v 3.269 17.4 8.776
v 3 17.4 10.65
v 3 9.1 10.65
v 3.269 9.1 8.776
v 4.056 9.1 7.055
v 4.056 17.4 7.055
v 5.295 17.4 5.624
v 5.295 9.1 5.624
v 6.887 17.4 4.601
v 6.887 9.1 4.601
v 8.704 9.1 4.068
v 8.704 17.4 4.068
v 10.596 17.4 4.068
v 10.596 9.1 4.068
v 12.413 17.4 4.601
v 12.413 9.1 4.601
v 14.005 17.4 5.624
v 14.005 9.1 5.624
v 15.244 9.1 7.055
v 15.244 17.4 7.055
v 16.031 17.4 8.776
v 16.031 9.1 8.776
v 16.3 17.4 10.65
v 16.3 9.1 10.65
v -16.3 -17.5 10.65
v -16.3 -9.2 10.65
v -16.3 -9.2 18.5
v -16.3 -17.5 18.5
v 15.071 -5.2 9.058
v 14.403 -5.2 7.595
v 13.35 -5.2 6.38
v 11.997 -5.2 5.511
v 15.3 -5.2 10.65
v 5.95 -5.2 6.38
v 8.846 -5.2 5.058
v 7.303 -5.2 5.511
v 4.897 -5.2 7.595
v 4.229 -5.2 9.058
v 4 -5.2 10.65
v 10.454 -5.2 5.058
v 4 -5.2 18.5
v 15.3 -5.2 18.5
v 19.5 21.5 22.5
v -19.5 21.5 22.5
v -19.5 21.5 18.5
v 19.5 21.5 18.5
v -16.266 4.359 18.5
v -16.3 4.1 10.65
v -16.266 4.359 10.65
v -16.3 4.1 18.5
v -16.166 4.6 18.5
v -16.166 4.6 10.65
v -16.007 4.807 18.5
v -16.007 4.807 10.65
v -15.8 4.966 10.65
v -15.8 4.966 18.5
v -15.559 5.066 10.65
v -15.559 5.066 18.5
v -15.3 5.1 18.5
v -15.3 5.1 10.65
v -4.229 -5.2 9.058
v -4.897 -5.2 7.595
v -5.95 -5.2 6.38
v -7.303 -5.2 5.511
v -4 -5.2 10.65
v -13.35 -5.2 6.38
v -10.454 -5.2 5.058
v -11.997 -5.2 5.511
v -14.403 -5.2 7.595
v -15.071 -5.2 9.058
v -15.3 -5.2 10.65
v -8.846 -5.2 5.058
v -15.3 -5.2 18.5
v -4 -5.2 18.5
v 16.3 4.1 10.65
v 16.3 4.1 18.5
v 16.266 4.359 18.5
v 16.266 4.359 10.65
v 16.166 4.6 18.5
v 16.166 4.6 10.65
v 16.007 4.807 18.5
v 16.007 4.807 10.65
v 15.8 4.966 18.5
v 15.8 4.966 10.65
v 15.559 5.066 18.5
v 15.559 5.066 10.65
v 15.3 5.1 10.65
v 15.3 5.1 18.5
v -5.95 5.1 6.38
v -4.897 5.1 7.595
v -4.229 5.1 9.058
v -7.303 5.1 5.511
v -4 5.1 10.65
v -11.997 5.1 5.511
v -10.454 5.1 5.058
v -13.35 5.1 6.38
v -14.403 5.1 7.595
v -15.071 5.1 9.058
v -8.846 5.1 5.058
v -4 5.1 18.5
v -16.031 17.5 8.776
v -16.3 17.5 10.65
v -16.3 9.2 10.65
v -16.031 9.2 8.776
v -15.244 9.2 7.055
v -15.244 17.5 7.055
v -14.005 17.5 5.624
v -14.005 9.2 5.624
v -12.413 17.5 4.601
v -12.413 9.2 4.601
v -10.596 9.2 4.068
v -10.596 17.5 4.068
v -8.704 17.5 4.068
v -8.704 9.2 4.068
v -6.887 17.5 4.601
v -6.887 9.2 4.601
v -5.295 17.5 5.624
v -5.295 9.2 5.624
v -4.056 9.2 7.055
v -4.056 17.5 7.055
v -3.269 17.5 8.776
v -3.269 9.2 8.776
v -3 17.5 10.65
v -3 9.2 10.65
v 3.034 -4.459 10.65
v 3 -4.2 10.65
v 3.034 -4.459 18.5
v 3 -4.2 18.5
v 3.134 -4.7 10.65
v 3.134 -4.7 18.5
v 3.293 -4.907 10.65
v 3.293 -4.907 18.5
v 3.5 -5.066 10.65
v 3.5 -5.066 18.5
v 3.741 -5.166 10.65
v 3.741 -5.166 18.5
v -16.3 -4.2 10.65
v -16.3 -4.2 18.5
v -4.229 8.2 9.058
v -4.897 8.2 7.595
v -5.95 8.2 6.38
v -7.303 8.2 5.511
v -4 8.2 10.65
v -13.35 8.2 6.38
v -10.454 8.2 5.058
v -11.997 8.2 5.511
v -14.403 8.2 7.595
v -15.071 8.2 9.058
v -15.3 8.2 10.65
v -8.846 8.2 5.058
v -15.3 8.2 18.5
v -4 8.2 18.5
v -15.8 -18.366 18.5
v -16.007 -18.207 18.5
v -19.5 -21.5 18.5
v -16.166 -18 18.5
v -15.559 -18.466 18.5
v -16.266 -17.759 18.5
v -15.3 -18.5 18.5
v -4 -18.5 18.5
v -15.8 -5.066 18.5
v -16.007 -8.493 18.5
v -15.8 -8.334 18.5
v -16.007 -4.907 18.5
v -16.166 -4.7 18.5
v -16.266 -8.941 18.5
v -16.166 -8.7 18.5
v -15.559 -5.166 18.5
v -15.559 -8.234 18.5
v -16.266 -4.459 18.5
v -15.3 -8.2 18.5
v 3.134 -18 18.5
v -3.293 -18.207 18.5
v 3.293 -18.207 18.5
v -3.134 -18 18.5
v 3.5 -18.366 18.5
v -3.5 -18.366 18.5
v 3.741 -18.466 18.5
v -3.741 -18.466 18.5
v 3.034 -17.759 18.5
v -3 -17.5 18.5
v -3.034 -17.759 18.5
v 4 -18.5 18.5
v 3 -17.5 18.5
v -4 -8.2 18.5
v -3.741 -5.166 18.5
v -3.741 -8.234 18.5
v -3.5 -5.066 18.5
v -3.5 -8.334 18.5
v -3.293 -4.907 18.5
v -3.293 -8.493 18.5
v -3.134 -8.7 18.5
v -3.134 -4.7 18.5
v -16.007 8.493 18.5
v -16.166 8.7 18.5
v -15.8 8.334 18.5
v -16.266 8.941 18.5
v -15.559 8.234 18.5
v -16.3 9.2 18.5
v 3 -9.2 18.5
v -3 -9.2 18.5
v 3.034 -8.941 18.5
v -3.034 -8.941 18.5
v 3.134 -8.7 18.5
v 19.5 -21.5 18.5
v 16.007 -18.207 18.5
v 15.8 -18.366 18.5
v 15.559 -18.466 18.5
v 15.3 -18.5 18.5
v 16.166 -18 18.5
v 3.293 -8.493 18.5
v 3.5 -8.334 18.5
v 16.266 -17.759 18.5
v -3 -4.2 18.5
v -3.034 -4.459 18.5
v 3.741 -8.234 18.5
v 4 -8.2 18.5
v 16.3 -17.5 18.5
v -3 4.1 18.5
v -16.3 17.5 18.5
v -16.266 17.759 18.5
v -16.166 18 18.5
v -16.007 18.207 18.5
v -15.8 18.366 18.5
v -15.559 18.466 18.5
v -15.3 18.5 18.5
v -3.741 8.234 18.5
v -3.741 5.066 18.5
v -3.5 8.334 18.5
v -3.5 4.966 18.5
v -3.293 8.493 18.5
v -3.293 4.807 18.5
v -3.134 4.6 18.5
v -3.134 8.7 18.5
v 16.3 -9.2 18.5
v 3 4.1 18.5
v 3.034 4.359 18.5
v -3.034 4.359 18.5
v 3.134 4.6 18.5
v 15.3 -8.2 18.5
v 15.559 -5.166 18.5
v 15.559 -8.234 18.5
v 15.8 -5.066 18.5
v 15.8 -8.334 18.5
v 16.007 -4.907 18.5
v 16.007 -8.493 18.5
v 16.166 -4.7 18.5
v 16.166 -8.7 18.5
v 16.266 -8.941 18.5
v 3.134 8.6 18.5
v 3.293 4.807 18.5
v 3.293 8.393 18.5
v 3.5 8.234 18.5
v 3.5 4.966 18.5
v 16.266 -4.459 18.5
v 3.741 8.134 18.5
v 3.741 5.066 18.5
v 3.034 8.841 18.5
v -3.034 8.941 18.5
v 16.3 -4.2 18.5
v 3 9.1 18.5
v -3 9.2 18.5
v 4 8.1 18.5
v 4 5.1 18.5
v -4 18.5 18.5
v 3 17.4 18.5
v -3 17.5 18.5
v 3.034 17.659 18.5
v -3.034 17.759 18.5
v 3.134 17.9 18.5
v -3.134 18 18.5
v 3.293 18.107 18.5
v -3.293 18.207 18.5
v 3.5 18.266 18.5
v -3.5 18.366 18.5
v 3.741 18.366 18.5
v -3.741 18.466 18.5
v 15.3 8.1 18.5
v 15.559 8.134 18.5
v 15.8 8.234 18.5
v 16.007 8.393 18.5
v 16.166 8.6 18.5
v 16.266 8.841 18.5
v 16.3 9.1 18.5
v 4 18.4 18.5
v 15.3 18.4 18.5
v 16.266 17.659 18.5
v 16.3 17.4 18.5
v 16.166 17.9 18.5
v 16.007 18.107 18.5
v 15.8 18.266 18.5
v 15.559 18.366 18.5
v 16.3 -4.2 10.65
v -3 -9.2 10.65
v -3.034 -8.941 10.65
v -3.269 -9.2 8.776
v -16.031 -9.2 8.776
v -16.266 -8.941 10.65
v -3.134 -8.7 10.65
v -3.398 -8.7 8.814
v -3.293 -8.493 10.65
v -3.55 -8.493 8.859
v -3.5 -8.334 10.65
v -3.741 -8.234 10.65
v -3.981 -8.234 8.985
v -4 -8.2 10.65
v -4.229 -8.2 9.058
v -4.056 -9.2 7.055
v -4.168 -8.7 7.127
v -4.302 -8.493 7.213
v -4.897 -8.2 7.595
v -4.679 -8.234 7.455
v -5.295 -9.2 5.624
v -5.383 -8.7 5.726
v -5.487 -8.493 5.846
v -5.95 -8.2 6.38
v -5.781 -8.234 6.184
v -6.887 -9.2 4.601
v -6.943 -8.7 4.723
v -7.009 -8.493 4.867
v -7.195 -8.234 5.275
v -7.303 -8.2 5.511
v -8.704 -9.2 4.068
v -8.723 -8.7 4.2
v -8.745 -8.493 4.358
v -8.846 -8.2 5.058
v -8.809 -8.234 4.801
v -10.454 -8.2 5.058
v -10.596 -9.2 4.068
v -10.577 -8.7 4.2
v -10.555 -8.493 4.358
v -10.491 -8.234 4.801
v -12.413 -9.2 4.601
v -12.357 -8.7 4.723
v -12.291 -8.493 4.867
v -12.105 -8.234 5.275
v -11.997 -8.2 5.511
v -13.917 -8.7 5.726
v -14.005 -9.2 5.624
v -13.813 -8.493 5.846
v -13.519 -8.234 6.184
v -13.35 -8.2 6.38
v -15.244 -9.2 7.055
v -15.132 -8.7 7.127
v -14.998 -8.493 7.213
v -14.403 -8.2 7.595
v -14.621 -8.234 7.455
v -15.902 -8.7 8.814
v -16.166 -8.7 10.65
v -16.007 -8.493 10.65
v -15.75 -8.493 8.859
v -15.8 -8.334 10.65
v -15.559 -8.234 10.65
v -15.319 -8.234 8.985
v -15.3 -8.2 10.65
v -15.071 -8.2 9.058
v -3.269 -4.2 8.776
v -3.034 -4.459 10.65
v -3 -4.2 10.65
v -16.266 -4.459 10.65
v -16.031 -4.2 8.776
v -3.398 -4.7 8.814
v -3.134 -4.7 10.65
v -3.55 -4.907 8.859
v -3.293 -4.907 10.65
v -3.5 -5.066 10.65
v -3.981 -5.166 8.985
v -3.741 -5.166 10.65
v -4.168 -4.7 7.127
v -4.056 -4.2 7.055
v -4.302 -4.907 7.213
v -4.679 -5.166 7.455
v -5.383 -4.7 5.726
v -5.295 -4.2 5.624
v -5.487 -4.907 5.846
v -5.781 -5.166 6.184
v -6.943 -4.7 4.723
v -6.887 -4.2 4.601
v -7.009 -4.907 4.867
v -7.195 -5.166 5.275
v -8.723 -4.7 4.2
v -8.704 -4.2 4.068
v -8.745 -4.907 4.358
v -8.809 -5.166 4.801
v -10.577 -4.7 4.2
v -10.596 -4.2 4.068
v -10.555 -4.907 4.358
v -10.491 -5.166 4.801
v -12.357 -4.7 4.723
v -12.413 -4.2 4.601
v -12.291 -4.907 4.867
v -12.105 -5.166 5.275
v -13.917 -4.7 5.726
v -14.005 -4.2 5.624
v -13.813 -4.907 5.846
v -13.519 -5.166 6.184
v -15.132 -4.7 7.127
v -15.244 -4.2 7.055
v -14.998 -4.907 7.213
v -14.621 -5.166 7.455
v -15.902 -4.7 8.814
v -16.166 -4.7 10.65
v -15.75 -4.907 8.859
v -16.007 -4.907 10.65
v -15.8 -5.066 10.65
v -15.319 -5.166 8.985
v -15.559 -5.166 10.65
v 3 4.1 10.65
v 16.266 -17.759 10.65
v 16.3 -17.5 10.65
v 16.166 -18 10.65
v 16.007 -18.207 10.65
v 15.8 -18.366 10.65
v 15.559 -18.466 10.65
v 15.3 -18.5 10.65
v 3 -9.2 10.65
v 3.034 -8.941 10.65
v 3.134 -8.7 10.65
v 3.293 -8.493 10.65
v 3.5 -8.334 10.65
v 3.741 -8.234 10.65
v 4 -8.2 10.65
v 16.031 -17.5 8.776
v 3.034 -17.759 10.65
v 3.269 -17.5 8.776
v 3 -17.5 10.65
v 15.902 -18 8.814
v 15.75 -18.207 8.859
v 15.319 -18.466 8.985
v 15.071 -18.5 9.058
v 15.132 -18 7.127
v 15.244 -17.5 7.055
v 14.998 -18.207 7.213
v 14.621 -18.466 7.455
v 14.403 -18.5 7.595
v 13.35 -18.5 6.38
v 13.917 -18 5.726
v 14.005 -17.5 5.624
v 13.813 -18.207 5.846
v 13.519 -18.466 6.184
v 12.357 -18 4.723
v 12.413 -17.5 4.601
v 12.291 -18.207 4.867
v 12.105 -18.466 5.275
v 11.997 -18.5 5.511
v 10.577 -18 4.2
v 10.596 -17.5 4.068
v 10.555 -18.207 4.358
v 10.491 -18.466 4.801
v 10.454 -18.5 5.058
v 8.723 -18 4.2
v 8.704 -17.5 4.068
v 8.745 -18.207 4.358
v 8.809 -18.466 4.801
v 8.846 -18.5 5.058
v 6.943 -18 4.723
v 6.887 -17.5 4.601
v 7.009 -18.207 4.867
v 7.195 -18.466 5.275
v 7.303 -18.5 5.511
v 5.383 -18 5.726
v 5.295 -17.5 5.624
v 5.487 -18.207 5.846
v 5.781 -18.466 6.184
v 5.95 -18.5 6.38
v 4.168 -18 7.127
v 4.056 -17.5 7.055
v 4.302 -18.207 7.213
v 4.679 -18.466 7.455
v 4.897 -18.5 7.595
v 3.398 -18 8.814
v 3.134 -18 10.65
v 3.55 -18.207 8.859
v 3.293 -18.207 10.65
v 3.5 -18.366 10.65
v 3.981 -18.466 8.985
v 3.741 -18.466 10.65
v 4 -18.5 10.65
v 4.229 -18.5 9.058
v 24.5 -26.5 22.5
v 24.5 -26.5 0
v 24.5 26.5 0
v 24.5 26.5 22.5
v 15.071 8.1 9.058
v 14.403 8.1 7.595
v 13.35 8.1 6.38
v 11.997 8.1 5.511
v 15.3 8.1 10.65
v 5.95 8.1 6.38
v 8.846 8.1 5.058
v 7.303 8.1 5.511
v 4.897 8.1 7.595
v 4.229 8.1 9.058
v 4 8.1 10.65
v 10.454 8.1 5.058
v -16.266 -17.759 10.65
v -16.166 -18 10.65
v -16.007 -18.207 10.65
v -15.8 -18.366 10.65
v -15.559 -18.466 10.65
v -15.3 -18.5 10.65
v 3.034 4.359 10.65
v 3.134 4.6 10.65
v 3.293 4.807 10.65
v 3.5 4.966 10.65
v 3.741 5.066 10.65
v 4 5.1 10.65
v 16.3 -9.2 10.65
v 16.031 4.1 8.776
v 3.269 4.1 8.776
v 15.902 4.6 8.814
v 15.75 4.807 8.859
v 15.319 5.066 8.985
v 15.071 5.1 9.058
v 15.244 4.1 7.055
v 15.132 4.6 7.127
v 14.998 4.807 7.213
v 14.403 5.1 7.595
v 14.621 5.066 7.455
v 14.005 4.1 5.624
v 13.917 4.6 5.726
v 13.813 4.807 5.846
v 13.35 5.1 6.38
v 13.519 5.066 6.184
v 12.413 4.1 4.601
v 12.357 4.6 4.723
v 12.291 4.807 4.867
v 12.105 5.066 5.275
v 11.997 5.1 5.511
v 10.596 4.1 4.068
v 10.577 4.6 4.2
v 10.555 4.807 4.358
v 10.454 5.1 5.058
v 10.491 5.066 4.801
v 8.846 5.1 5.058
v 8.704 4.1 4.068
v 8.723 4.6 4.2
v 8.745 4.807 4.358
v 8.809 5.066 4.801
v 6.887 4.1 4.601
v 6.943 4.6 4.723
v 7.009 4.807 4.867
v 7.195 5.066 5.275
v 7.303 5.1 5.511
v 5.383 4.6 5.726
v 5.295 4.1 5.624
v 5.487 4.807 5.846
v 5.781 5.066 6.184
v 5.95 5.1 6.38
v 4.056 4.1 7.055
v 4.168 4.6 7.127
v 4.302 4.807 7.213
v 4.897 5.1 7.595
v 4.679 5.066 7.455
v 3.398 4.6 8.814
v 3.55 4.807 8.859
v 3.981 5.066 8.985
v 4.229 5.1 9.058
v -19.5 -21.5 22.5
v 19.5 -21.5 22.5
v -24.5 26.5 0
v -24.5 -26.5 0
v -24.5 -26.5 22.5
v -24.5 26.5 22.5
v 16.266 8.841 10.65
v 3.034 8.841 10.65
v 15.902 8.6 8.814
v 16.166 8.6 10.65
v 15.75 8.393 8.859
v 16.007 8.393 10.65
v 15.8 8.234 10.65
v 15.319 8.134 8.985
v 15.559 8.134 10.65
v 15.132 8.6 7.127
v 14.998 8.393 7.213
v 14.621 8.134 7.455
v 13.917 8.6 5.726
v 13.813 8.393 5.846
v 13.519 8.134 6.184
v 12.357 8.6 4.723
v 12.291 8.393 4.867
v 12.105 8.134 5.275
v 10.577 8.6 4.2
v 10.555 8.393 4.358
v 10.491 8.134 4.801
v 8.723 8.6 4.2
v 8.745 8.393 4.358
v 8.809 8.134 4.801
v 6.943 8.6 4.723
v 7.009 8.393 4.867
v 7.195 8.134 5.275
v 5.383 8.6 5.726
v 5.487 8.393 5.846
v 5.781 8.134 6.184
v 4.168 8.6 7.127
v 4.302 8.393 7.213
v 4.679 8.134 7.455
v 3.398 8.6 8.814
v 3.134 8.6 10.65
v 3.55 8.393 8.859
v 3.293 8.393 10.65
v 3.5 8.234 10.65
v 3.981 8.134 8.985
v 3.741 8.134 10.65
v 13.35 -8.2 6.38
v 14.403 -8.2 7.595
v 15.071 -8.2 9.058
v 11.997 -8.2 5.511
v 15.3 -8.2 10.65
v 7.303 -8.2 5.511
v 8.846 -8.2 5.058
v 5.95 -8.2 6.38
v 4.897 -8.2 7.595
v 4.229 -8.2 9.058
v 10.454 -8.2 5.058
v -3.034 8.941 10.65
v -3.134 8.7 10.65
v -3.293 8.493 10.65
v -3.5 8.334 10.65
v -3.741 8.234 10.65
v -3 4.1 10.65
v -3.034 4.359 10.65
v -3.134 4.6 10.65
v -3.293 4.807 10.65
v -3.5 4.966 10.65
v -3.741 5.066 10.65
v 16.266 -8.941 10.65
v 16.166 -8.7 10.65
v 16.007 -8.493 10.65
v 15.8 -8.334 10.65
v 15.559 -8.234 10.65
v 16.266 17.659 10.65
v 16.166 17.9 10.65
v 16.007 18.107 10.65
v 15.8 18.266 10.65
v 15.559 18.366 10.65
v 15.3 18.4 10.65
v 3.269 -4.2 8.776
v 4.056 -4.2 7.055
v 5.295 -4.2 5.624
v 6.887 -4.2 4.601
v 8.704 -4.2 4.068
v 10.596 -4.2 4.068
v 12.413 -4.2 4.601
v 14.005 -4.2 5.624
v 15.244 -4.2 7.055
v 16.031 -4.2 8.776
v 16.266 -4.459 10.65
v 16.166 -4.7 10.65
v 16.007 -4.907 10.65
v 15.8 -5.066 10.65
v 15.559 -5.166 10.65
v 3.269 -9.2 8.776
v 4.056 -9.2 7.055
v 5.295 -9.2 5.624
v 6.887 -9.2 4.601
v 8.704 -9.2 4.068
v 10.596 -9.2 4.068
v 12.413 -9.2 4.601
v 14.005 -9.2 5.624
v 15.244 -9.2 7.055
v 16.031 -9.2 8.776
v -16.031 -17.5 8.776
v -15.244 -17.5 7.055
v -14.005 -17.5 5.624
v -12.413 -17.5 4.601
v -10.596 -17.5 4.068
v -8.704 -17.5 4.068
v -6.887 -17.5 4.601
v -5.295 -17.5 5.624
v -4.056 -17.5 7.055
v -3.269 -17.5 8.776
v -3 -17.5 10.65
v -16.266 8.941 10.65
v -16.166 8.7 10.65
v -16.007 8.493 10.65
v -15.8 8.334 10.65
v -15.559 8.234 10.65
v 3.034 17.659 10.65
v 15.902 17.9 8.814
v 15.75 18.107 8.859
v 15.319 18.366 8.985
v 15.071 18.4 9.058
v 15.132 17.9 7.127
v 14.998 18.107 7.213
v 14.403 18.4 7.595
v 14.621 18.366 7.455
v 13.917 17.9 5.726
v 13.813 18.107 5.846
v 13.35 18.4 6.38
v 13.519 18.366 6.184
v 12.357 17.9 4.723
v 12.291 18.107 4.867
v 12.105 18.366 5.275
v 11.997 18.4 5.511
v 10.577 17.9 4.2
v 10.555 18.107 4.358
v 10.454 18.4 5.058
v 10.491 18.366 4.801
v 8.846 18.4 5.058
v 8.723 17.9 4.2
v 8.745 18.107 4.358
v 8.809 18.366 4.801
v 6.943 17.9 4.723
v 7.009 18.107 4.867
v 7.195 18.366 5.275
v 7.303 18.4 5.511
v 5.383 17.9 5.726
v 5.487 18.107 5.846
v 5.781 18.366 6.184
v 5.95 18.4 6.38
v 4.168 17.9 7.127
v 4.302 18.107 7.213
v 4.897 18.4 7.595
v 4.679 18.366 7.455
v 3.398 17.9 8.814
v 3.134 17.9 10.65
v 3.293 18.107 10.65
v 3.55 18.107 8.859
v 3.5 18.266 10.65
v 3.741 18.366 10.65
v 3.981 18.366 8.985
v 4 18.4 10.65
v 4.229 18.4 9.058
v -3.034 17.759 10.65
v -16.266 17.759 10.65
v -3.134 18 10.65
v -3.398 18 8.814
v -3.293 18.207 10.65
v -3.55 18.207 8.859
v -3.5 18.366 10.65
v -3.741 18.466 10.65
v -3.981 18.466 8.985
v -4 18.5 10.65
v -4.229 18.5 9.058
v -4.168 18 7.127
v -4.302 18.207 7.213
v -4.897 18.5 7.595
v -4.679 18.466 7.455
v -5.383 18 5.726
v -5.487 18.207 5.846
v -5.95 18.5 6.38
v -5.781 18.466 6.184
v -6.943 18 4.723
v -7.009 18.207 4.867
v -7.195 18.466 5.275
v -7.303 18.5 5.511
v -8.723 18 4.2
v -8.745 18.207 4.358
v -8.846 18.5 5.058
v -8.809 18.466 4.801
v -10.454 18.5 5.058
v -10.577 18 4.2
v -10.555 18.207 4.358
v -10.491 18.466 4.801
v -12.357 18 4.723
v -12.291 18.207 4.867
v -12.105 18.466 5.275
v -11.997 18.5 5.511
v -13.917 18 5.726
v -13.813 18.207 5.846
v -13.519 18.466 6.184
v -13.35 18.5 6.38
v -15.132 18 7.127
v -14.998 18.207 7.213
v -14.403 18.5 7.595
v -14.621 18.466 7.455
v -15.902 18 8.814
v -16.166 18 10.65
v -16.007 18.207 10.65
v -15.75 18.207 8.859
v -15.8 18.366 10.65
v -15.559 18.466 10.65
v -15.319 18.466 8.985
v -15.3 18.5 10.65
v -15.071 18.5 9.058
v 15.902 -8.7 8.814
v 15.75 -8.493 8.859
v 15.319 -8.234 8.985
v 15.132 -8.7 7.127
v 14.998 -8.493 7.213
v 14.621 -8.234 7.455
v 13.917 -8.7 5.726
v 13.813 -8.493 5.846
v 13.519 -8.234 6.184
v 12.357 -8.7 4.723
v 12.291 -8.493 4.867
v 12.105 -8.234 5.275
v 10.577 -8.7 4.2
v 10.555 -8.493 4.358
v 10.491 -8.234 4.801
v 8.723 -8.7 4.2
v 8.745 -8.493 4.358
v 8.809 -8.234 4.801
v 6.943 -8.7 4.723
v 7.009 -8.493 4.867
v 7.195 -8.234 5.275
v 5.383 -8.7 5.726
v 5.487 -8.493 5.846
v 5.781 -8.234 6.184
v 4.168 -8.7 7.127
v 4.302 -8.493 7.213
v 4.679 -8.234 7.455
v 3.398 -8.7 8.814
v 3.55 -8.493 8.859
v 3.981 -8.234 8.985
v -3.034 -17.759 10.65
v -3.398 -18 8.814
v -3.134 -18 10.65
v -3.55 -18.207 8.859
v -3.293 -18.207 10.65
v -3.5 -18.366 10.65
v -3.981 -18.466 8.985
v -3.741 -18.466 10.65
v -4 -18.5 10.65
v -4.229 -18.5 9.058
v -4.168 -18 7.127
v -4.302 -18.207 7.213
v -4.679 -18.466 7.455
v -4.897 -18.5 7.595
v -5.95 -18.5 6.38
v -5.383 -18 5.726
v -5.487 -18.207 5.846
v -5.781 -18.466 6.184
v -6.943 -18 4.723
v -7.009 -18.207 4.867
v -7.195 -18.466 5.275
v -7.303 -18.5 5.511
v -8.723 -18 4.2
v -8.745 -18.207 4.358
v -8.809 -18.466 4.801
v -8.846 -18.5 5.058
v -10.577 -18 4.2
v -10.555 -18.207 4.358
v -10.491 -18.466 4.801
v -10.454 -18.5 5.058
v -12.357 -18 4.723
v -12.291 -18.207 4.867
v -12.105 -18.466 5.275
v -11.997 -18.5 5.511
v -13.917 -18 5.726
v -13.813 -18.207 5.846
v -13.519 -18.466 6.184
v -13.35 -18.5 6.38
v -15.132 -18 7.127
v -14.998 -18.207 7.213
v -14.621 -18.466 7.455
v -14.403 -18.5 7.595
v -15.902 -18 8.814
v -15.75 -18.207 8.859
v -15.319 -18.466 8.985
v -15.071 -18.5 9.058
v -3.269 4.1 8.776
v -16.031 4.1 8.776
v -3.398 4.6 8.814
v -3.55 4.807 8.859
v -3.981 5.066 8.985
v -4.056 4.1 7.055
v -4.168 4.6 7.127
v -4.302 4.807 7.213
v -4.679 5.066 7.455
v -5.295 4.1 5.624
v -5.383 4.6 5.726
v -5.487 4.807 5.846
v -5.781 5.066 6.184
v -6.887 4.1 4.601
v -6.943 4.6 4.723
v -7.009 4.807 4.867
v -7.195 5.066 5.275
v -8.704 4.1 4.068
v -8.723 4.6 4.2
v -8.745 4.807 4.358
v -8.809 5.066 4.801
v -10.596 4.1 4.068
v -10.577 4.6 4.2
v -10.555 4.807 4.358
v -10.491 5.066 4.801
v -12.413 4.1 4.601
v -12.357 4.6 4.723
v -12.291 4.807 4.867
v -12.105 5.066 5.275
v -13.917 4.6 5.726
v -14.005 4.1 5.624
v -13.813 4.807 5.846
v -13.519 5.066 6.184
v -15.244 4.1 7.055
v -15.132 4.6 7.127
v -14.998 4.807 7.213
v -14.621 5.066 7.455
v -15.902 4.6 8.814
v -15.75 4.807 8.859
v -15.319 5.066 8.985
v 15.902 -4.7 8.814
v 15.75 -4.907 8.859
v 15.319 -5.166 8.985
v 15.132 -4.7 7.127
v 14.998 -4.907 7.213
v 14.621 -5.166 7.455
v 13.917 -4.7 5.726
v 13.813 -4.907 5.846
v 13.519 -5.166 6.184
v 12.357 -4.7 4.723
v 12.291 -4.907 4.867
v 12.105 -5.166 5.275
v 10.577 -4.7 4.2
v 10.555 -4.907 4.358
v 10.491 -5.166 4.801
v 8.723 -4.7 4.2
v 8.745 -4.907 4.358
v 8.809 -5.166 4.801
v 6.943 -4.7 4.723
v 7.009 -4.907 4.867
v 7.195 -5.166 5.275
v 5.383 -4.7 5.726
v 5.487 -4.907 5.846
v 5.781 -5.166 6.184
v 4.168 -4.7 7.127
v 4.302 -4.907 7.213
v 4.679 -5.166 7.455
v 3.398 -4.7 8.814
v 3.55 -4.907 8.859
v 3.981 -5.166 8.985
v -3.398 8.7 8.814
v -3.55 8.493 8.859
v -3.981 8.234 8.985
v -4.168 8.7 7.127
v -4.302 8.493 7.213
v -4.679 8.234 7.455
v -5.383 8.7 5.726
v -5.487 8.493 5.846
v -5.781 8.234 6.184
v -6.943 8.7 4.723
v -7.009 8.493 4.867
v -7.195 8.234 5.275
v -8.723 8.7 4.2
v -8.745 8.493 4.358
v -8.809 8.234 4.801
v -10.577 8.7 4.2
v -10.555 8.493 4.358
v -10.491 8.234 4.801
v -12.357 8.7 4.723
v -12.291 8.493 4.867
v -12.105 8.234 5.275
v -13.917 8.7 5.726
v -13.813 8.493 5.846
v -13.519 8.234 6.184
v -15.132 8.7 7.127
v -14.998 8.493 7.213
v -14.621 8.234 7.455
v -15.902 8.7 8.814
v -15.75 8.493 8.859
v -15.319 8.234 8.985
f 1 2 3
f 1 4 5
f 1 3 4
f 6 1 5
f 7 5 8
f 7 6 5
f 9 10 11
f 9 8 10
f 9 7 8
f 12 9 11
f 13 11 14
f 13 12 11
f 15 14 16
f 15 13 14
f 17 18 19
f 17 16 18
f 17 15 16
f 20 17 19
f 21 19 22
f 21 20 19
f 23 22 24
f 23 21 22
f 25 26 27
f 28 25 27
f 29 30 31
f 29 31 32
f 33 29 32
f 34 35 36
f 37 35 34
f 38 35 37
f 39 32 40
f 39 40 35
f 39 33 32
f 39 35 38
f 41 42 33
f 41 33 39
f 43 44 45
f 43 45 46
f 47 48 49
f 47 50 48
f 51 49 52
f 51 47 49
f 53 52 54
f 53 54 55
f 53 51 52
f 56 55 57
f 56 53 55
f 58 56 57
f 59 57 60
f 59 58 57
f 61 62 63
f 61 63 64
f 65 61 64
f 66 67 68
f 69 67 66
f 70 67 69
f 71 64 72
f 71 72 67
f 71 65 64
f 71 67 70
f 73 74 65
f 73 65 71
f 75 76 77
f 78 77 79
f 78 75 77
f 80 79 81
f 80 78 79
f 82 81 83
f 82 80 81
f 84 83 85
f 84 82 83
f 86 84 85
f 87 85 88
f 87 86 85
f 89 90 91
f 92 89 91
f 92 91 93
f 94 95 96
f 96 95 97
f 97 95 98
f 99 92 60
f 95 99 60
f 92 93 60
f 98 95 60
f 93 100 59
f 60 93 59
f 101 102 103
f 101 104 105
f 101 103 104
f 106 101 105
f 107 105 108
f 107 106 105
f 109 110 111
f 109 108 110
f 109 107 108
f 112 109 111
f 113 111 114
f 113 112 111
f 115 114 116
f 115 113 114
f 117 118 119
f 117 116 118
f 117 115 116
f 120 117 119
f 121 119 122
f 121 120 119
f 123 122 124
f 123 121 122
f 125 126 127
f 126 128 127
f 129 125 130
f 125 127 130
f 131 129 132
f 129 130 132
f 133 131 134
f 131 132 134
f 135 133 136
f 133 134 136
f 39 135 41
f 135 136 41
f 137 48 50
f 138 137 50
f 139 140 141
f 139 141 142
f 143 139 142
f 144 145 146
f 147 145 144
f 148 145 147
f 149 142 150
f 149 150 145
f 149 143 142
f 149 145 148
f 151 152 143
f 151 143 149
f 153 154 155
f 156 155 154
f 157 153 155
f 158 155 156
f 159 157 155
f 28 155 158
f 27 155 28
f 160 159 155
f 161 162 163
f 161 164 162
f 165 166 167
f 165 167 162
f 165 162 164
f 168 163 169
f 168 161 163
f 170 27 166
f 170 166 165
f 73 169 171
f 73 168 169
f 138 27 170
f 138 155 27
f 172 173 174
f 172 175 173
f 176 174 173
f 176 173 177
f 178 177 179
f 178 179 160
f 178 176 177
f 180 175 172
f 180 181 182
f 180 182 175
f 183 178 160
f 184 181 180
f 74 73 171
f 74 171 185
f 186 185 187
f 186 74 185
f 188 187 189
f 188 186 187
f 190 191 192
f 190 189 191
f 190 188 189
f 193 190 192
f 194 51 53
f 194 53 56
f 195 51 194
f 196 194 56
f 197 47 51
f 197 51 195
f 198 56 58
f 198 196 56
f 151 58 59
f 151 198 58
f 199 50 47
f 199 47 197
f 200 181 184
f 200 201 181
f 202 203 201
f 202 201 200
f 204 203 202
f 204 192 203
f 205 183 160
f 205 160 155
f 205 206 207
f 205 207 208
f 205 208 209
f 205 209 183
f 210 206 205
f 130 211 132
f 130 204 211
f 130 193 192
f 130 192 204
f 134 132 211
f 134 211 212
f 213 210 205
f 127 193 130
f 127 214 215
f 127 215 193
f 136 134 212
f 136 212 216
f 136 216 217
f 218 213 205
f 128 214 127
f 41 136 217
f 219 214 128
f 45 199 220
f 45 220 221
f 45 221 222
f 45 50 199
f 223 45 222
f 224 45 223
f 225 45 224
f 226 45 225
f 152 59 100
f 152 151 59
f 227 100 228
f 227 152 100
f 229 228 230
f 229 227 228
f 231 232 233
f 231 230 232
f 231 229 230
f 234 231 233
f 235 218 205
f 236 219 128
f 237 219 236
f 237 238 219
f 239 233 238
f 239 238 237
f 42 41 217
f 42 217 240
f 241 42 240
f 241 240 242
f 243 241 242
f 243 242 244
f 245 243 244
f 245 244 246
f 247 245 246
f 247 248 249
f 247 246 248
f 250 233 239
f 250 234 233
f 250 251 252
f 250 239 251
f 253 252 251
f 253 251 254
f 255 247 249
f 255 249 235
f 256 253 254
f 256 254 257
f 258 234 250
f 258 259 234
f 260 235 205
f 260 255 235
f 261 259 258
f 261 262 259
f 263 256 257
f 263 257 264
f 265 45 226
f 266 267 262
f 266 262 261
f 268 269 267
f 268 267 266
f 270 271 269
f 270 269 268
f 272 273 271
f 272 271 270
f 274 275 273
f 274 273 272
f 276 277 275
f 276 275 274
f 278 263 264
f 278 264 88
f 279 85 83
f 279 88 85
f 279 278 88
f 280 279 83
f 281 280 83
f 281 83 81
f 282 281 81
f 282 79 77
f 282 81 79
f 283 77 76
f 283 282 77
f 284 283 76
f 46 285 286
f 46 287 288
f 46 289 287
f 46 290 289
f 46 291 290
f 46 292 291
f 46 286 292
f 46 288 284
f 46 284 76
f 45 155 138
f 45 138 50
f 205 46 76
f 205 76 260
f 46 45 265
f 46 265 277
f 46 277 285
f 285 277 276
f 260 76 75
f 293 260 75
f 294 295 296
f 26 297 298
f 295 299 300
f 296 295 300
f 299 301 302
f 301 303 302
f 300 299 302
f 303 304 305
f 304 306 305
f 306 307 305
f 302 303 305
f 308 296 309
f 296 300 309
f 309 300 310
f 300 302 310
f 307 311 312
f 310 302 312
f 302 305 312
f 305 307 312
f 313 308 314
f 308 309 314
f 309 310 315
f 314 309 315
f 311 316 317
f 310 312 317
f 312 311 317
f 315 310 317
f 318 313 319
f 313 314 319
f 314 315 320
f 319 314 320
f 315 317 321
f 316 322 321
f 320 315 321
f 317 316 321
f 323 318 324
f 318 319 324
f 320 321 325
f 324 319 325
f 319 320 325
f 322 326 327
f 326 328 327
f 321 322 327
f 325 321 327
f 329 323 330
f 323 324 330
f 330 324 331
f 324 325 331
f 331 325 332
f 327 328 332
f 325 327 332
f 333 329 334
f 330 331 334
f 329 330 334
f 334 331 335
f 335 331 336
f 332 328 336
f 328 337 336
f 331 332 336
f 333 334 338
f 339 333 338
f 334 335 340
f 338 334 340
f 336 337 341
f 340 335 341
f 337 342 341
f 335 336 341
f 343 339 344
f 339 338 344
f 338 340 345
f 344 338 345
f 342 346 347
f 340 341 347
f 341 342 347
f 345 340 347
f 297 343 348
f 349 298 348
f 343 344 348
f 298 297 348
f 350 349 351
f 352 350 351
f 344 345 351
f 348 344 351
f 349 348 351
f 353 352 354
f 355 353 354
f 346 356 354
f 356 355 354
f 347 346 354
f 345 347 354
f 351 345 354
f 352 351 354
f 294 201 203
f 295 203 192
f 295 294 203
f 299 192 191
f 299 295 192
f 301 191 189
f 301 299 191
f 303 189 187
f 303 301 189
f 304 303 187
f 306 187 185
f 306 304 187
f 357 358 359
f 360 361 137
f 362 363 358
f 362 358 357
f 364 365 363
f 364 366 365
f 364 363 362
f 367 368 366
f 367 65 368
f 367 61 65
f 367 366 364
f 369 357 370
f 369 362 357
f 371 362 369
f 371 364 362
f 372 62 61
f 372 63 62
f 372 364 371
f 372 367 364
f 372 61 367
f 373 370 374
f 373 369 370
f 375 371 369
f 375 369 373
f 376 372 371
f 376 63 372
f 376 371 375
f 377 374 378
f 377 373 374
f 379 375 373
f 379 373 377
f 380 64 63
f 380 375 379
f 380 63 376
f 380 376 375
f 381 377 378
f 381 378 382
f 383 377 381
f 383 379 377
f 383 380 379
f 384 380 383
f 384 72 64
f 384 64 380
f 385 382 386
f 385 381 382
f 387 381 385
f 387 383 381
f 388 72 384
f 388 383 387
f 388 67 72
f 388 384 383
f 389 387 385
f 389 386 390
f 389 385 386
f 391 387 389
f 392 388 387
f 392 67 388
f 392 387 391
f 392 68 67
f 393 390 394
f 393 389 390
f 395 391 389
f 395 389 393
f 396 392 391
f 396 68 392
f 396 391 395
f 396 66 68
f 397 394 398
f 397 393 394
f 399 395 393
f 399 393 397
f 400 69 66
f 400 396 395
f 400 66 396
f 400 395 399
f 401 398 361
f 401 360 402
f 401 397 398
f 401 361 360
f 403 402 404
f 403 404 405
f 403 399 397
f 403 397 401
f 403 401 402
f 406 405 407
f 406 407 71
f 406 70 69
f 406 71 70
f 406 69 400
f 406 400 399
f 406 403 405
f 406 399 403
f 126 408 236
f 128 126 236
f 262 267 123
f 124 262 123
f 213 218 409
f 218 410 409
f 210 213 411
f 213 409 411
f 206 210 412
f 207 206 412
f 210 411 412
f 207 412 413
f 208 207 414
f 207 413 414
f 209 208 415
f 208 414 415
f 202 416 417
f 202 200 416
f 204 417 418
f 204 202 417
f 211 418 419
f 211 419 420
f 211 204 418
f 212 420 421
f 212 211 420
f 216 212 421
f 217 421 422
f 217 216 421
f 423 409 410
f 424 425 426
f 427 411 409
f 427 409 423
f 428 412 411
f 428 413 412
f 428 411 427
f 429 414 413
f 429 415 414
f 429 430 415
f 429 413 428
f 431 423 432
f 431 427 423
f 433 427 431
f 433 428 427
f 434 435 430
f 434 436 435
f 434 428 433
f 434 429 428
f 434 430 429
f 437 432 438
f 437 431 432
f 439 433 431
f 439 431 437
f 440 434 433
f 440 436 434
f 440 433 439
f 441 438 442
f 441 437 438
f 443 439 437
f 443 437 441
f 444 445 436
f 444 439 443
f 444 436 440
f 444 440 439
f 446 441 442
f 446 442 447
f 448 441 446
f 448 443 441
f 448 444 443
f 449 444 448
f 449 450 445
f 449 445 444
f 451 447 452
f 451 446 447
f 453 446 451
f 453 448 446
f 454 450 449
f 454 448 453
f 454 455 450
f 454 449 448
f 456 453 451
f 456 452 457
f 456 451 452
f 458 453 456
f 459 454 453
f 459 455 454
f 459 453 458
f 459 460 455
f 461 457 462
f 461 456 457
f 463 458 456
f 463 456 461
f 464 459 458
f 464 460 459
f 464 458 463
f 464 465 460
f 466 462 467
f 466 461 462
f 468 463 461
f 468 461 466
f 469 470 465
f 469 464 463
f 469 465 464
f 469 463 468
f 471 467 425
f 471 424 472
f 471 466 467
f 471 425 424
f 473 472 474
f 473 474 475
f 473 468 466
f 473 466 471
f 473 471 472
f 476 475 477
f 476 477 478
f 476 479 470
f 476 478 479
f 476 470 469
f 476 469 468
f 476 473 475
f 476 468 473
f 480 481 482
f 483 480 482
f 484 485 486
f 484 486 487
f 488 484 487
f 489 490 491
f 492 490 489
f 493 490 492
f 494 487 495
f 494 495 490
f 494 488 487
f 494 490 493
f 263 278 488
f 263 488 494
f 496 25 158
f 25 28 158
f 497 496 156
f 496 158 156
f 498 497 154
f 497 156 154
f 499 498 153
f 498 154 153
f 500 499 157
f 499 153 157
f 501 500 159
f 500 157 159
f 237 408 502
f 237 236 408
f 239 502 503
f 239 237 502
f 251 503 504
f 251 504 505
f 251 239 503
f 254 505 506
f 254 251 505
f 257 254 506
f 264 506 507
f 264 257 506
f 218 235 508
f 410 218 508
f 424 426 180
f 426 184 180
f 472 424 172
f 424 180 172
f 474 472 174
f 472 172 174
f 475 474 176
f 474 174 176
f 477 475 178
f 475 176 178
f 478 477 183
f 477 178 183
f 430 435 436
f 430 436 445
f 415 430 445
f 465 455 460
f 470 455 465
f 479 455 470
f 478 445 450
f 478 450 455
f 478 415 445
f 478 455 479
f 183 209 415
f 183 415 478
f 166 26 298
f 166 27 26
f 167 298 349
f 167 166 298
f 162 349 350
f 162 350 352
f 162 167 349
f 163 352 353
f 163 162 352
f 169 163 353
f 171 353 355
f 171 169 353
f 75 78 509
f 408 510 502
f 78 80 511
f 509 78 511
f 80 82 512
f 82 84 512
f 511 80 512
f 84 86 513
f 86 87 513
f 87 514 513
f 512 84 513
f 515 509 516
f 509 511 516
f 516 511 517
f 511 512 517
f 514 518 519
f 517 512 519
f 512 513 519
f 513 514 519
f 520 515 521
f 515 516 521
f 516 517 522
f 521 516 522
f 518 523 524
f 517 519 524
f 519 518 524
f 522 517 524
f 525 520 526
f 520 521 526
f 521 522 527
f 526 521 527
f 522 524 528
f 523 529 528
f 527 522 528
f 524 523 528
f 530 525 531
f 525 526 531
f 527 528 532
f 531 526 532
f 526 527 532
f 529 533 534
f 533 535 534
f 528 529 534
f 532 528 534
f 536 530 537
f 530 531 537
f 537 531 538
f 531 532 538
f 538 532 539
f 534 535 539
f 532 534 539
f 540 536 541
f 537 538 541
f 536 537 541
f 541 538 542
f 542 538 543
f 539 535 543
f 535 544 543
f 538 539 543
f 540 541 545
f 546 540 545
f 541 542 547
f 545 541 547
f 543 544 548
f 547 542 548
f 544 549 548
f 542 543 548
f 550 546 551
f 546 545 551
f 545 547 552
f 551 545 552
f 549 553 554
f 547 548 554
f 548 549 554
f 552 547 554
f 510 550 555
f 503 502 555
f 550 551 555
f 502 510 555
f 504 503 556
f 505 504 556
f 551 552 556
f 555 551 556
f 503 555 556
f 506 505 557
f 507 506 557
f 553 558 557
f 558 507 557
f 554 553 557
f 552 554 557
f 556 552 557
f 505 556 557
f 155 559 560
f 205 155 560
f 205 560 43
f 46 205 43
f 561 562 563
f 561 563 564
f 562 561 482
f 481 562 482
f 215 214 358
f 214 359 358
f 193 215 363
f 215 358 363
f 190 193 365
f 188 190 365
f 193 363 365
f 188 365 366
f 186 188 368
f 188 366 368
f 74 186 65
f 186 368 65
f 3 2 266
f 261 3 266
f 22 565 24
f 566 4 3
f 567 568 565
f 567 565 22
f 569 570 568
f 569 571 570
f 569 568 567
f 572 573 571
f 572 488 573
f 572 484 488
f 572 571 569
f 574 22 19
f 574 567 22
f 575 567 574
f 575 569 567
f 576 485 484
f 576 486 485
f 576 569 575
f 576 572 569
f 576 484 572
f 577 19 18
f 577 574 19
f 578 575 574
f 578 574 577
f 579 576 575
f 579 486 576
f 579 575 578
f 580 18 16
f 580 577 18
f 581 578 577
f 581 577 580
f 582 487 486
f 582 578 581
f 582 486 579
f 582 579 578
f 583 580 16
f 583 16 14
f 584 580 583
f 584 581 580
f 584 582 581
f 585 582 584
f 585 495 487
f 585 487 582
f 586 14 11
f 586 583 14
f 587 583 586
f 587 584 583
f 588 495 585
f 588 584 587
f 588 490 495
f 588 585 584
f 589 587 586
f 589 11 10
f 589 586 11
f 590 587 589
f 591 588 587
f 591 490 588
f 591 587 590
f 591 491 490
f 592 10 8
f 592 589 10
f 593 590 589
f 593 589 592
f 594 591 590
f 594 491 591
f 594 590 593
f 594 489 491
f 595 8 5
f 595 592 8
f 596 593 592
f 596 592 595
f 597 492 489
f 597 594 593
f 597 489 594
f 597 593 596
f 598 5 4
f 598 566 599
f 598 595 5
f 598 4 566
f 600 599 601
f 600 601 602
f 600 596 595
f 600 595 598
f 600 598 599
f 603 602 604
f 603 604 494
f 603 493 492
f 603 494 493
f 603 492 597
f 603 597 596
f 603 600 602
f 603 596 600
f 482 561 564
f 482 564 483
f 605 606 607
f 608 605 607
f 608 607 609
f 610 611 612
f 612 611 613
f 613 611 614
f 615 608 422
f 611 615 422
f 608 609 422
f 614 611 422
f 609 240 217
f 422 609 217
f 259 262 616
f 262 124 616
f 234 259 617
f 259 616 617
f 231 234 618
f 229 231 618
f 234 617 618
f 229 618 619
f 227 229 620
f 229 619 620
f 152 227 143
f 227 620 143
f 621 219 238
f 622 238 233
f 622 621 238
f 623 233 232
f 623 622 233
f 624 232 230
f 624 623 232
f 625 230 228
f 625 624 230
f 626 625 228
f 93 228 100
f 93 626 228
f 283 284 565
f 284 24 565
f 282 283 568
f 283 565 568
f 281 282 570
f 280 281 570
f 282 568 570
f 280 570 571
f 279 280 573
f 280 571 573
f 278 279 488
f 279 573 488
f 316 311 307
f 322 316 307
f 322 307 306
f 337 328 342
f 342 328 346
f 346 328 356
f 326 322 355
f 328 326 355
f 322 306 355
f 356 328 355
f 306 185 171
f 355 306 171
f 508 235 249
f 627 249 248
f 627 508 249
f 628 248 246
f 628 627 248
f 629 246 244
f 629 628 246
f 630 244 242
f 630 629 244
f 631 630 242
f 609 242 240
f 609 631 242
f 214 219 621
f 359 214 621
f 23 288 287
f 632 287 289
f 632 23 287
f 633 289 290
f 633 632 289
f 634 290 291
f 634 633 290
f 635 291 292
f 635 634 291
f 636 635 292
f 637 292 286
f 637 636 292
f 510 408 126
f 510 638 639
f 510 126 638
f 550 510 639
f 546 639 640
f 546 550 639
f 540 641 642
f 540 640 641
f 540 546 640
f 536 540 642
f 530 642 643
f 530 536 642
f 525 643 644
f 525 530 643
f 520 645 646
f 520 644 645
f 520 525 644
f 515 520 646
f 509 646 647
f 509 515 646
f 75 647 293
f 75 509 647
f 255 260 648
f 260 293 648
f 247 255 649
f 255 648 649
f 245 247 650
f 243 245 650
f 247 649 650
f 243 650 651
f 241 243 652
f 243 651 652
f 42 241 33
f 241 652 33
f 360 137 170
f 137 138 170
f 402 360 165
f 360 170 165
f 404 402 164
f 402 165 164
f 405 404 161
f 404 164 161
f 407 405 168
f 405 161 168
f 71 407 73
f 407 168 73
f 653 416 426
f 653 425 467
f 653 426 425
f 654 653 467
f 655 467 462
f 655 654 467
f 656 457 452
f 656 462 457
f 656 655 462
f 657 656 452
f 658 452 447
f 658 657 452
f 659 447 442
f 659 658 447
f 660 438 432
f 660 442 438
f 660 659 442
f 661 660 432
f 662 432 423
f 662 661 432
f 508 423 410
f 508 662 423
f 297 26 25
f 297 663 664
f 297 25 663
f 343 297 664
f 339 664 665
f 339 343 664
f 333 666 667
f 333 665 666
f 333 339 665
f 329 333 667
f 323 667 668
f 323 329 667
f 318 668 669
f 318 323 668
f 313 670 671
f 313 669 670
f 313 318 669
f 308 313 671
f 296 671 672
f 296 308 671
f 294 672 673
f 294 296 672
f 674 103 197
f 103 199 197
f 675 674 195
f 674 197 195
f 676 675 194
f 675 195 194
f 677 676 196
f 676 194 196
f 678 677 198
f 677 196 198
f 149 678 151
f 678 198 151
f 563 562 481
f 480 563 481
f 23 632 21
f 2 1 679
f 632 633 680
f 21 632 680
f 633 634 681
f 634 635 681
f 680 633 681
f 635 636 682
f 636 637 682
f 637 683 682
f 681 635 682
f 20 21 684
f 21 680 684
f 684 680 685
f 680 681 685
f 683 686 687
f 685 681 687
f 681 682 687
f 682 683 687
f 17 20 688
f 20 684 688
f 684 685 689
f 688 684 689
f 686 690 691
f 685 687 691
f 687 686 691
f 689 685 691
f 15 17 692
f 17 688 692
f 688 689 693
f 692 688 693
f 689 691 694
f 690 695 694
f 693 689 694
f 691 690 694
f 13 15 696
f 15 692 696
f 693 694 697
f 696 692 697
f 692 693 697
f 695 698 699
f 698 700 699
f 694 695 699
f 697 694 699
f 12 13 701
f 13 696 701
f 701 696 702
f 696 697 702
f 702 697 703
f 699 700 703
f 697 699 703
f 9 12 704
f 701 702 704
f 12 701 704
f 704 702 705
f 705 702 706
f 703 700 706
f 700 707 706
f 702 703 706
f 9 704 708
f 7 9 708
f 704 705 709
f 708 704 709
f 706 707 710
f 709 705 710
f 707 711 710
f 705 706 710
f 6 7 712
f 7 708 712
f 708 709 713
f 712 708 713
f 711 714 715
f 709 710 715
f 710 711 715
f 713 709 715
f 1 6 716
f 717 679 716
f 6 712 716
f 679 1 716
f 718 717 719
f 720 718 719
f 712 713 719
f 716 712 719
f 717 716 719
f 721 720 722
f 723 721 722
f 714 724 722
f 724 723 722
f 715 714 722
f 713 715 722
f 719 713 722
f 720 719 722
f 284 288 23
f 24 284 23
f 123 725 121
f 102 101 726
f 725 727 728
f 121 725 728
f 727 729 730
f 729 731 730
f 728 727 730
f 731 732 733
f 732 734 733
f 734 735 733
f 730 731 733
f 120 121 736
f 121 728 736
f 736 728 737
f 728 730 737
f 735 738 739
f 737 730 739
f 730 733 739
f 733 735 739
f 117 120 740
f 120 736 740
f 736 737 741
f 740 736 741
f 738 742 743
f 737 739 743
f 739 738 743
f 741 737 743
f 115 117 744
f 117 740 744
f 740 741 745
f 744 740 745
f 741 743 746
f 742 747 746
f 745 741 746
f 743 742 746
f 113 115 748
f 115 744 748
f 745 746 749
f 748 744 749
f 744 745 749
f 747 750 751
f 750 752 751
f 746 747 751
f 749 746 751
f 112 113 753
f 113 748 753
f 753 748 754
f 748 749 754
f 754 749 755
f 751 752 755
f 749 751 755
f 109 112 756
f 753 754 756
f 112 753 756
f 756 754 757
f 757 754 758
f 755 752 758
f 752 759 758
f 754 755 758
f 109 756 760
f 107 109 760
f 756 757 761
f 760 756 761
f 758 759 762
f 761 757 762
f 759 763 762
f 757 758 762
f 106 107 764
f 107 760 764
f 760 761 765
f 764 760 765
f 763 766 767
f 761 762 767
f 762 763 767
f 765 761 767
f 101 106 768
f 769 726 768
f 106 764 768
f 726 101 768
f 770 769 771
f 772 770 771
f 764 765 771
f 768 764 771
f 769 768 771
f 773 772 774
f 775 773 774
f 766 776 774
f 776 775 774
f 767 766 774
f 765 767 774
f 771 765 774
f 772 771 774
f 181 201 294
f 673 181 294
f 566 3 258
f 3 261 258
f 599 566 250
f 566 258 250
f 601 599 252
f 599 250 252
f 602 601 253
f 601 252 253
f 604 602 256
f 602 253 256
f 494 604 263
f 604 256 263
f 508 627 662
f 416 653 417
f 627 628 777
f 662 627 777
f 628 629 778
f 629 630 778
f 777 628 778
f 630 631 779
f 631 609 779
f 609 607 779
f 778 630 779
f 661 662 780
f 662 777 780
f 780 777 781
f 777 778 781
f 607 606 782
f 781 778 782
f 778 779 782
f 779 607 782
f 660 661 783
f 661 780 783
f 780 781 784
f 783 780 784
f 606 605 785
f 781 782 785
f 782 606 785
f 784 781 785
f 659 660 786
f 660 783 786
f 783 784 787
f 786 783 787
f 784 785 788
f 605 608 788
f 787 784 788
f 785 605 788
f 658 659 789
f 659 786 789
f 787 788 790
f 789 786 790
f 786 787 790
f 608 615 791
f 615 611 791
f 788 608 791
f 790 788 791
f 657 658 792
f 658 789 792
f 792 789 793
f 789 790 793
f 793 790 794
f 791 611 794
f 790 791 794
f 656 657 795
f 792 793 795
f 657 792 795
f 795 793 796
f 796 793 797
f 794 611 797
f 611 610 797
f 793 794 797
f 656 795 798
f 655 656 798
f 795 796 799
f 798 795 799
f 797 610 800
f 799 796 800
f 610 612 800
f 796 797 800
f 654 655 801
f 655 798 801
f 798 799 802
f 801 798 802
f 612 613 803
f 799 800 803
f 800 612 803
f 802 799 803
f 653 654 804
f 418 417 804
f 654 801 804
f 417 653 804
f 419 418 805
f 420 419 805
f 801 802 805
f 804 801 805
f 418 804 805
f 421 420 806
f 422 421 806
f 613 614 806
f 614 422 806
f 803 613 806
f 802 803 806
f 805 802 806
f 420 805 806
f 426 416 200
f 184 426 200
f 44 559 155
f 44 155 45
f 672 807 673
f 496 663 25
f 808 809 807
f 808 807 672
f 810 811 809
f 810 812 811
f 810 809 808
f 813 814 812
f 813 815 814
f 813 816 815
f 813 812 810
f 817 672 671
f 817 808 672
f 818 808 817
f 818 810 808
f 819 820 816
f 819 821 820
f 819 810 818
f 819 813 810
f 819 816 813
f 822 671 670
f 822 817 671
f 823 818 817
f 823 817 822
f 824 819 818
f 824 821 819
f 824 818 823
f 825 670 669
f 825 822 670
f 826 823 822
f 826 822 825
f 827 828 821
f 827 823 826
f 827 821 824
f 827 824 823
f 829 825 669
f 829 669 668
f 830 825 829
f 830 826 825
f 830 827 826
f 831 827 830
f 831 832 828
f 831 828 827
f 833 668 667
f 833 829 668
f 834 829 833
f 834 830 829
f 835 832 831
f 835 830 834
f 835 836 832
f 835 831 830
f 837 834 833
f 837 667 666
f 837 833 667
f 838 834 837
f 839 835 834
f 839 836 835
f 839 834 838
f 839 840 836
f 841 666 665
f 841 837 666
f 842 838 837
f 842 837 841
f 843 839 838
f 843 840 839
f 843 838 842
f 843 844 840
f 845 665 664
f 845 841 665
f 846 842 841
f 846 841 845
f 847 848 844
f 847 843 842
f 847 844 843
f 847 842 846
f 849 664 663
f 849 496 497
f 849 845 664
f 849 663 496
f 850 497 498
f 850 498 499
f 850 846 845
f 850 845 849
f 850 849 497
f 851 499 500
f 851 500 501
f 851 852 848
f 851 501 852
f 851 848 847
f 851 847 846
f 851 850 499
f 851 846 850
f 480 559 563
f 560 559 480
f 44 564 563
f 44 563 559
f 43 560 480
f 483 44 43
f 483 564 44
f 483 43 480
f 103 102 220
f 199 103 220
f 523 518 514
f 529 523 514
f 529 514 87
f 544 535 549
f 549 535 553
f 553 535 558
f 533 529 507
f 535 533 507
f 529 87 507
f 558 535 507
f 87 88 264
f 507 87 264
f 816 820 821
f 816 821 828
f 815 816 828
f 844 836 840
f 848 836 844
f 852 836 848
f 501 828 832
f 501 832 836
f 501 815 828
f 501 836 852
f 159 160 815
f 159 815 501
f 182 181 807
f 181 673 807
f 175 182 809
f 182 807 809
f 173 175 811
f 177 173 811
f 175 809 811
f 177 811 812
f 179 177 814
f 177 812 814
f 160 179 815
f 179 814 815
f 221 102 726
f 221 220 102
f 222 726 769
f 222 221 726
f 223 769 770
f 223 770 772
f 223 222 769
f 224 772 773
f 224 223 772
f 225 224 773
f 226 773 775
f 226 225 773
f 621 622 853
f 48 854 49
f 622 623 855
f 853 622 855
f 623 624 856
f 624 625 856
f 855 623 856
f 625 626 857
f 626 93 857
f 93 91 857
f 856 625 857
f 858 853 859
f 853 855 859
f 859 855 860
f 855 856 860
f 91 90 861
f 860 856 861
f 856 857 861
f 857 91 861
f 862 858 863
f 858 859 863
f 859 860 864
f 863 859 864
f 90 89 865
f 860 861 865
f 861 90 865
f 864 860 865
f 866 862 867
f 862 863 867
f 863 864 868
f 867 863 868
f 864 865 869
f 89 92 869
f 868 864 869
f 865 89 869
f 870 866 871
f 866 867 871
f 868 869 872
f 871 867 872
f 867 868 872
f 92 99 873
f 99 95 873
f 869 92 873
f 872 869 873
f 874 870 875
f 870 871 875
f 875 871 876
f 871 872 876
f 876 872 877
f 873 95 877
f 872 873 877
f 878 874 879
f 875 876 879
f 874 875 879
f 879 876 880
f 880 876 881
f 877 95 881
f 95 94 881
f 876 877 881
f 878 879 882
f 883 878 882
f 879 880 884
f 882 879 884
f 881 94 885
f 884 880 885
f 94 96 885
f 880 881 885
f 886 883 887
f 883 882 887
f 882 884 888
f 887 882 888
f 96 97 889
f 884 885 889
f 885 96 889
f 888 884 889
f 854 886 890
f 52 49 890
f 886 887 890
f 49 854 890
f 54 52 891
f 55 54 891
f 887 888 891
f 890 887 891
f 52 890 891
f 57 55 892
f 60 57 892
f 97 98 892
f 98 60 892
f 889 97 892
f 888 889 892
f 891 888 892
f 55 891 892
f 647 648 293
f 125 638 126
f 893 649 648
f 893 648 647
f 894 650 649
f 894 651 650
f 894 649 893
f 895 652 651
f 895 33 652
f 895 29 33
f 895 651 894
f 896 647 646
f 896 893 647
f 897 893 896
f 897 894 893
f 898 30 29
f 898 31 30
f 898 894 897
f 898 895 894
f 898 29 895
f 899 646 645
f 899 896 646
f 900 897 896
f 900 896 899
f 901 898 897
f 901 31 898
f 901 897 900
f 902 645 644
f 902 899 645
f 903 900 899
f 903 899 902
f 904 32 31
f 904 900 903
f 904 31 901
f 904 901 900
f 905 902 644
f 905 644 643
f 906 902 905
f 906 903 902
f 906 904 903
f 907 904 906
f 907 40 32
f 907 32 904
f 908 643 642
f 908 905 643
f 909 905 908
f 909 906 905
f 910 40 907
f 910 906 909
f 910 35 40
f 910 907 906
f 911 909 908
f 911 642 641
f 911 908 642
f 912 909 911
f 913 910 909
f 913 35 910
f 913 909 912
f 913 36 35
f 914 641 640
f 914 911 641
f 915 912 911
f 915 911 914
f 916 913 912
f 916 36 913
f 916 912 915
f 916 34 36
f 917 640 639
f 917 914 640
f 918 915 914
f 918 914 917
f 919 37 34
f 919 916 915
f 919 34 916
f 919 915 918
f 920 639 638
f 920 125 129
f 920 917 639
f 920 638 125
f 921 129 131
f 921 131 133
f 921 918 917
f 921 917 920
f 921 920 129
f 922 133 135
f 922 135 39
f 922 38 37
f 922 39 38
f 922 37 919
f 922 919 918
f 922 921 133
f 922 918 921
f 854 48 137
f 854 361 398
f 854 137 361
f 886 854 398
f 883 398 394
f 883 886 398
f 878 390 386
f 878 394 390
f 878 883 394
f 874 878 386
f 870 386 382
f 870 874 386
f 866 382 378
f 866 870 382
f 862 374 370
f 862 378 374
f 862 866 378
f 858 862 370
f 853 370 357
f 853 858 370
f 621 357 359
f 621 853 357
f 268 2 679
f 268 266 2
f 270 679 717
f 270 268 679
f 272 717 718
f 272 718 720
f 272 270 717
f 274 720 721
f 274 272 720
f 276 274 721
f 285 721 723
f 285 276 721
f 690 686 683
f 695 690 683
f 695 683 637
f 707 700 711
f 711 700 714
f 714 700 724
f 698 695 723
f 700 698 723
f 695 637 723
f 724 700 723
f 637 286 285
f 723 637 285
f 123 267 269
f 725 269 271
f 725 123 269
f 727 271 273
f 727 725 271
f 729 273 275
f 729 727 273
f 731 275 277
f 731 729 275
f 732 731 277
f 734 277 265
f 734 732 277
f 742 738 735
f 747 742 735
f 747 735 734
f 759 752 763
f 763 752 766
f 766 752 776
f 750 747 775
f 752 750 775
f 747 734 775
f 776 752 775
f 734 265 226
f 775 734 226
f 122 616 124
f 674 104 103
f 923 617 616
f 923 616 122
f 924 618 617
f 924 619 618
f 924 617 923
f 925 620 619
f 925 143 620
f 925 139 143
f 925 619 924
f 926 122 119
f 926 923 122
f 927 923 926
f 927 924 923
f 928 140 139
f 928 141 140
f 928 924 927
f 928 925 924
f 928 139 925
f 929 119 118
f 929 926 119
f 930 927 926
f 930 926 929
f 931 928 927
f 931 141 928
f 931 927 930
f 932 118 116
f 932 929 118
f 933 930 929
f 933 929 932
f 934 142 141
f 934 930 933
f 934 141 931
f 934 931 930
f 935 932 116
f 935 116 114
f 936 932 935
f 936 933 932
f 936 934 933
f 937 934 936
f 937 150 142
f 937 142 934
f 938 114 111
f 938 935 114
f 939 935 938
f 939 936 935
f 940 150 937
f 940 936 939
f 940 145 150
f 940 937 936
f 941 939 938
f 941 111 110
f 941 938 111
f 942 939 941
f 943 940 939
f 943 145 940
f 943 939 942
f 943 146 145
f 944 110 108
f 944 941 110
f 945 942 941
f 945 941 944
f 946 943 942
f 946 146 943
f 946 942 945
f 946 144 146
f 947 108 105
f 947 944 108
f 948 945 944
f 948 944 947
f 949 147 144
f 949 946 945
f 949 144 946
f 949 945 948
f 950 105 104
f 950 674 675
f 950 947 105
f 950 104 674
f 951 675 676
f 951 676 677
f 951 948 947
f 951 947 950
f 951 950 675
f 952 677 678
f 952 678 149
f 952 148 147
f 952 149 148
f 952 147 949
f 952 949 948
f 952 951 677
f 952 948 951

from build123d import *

# Parameters (mm, degrees)
PAD001_DEPTH = 10.3
FILLET_R     = 1
SKETCH_W     = 49
SKETCH_H     = 53
PAD_DEPTH    = 22.5
SKETCH001_W  = 39
SKETCH001_H  = 43
POCKET_DEPTH = 4


with BuildPart() as cup001:
    # Sketch002 → Pad001 (new body)
    with BuildSketch(Plane.XZ):
        with BuildLine():
            Line((-6.65, 0), (6.65, 0))
            Line((6.65, 0), (6.65, -7.85))
            ThreePointArc((-6.65, -7.85), (0, -14.5), (6.65, -7.85))
            Line((-6.65, -7.85), (-6.65, 0))
        make_face()
    extrude(amount=PAD001_DEPTH)

    # Fillet
    fillet_edges = [cup001.edges().sort_by_distance(p)[0] for p in [
        (-6.65, -10.3, -3.925),
        (0, -10.3, -14.5),
        (6.65, -10.3, -3.925),
        (-6.65, 0, -3.925),
        (6.65, 0, -3.925),
        (0, 0, -14.5),
    ]]
    fillet(fillet_edges, radius=FILLET_R)


with BuildPart() as cup001_1:
    # Body001 placement: moved
    add(cup001.part.moved(Location((9.65, 16.95, 18.5))))


with BuildPart() as cup001_2:
    # Clone placement: moved
    add(cup001_1.part.moved(Location((0, 1.45, 0))))


with BuildPart() as cup002:
    # Clone001 base: copy of cup001
    add(cup001_2.part)


with BuildPart() as cup002_1:
    # Clone001 placement: moved
    add(cup002.part.moved(Location((0, -13.3, 0))))


with BuildPart() as cup003:
    # Clone002 base: copy of cup002
    add(cup002_1.part)


with BuildPart() as cup003_1:
    # Clone002 placement: moved
    add(cup003.part.moved(Location((0, -13.3, 0))))


with BuildPart() as cup004:
    # Clone003 base: copy of cup003
    add(cup003_1.part)


with BuildPart() as cup004_1:
    # Clone003 placement: moved
    add(cup004.part.moved(Location((-19.3, 26.7, 0))))


with BuildPart() as cup005:
    # Clone004 base: copy of cup004
    add(cup004_1.part)


with BuildPart() as cup005_1:
    # Clone004 placement: moved
    add(cup005.part.moved(Location((0, -13.4, 0))))


with BuildPart() as cup006:
    # Clone005 base: copy of cup005
    add(cup005_1.part)


with BuildPart() as cup006_1:
    # Clone005 placement: moved
    add(cup006.part.moved(Location((0, -13.3, 0))))


with BuildPart() as mold_bottom:
    # Sketch → Pad (new body)
    with BuildSketch(Plane.XY):
        Rectangle(SKETCH_W, SKETCH_H)
    extrude(amount=PAD_DEPTH)

    # Sketch001 (on Face6 of Pad) → Pocket (cut)
    with BuildSketch(Plane.XY.offset(22.5)):
        Rectangle(SKETCH001_W, SKETCH001_H)
    extrude(amount=-POCKET_DEPTH, mode=Mode.SUBTRACT)

    # Cut: cut cup001
    add(cup001_2.part, mode=Mode.SUBTRACT)

    # Cut001: cut cup002
    add(cup002_1.part, mode=Mode.SUBTRACT)

    # Cut002: cut cup003
    add(cup003_1.part, mode=Mode.SUBTRACT)

    # Cut003: cut cup004
    add(cup004_1.part, mode=Mode.SUBTRACT)

    # Cut004: cut cup005
    add(cup005_1.part, mode=Mode.SUBTRACT)

    # Cut005: cut cup006
    add(cup006_1.part, mode=Mode.SUBTRACT)


solid = mold_bottom.part
